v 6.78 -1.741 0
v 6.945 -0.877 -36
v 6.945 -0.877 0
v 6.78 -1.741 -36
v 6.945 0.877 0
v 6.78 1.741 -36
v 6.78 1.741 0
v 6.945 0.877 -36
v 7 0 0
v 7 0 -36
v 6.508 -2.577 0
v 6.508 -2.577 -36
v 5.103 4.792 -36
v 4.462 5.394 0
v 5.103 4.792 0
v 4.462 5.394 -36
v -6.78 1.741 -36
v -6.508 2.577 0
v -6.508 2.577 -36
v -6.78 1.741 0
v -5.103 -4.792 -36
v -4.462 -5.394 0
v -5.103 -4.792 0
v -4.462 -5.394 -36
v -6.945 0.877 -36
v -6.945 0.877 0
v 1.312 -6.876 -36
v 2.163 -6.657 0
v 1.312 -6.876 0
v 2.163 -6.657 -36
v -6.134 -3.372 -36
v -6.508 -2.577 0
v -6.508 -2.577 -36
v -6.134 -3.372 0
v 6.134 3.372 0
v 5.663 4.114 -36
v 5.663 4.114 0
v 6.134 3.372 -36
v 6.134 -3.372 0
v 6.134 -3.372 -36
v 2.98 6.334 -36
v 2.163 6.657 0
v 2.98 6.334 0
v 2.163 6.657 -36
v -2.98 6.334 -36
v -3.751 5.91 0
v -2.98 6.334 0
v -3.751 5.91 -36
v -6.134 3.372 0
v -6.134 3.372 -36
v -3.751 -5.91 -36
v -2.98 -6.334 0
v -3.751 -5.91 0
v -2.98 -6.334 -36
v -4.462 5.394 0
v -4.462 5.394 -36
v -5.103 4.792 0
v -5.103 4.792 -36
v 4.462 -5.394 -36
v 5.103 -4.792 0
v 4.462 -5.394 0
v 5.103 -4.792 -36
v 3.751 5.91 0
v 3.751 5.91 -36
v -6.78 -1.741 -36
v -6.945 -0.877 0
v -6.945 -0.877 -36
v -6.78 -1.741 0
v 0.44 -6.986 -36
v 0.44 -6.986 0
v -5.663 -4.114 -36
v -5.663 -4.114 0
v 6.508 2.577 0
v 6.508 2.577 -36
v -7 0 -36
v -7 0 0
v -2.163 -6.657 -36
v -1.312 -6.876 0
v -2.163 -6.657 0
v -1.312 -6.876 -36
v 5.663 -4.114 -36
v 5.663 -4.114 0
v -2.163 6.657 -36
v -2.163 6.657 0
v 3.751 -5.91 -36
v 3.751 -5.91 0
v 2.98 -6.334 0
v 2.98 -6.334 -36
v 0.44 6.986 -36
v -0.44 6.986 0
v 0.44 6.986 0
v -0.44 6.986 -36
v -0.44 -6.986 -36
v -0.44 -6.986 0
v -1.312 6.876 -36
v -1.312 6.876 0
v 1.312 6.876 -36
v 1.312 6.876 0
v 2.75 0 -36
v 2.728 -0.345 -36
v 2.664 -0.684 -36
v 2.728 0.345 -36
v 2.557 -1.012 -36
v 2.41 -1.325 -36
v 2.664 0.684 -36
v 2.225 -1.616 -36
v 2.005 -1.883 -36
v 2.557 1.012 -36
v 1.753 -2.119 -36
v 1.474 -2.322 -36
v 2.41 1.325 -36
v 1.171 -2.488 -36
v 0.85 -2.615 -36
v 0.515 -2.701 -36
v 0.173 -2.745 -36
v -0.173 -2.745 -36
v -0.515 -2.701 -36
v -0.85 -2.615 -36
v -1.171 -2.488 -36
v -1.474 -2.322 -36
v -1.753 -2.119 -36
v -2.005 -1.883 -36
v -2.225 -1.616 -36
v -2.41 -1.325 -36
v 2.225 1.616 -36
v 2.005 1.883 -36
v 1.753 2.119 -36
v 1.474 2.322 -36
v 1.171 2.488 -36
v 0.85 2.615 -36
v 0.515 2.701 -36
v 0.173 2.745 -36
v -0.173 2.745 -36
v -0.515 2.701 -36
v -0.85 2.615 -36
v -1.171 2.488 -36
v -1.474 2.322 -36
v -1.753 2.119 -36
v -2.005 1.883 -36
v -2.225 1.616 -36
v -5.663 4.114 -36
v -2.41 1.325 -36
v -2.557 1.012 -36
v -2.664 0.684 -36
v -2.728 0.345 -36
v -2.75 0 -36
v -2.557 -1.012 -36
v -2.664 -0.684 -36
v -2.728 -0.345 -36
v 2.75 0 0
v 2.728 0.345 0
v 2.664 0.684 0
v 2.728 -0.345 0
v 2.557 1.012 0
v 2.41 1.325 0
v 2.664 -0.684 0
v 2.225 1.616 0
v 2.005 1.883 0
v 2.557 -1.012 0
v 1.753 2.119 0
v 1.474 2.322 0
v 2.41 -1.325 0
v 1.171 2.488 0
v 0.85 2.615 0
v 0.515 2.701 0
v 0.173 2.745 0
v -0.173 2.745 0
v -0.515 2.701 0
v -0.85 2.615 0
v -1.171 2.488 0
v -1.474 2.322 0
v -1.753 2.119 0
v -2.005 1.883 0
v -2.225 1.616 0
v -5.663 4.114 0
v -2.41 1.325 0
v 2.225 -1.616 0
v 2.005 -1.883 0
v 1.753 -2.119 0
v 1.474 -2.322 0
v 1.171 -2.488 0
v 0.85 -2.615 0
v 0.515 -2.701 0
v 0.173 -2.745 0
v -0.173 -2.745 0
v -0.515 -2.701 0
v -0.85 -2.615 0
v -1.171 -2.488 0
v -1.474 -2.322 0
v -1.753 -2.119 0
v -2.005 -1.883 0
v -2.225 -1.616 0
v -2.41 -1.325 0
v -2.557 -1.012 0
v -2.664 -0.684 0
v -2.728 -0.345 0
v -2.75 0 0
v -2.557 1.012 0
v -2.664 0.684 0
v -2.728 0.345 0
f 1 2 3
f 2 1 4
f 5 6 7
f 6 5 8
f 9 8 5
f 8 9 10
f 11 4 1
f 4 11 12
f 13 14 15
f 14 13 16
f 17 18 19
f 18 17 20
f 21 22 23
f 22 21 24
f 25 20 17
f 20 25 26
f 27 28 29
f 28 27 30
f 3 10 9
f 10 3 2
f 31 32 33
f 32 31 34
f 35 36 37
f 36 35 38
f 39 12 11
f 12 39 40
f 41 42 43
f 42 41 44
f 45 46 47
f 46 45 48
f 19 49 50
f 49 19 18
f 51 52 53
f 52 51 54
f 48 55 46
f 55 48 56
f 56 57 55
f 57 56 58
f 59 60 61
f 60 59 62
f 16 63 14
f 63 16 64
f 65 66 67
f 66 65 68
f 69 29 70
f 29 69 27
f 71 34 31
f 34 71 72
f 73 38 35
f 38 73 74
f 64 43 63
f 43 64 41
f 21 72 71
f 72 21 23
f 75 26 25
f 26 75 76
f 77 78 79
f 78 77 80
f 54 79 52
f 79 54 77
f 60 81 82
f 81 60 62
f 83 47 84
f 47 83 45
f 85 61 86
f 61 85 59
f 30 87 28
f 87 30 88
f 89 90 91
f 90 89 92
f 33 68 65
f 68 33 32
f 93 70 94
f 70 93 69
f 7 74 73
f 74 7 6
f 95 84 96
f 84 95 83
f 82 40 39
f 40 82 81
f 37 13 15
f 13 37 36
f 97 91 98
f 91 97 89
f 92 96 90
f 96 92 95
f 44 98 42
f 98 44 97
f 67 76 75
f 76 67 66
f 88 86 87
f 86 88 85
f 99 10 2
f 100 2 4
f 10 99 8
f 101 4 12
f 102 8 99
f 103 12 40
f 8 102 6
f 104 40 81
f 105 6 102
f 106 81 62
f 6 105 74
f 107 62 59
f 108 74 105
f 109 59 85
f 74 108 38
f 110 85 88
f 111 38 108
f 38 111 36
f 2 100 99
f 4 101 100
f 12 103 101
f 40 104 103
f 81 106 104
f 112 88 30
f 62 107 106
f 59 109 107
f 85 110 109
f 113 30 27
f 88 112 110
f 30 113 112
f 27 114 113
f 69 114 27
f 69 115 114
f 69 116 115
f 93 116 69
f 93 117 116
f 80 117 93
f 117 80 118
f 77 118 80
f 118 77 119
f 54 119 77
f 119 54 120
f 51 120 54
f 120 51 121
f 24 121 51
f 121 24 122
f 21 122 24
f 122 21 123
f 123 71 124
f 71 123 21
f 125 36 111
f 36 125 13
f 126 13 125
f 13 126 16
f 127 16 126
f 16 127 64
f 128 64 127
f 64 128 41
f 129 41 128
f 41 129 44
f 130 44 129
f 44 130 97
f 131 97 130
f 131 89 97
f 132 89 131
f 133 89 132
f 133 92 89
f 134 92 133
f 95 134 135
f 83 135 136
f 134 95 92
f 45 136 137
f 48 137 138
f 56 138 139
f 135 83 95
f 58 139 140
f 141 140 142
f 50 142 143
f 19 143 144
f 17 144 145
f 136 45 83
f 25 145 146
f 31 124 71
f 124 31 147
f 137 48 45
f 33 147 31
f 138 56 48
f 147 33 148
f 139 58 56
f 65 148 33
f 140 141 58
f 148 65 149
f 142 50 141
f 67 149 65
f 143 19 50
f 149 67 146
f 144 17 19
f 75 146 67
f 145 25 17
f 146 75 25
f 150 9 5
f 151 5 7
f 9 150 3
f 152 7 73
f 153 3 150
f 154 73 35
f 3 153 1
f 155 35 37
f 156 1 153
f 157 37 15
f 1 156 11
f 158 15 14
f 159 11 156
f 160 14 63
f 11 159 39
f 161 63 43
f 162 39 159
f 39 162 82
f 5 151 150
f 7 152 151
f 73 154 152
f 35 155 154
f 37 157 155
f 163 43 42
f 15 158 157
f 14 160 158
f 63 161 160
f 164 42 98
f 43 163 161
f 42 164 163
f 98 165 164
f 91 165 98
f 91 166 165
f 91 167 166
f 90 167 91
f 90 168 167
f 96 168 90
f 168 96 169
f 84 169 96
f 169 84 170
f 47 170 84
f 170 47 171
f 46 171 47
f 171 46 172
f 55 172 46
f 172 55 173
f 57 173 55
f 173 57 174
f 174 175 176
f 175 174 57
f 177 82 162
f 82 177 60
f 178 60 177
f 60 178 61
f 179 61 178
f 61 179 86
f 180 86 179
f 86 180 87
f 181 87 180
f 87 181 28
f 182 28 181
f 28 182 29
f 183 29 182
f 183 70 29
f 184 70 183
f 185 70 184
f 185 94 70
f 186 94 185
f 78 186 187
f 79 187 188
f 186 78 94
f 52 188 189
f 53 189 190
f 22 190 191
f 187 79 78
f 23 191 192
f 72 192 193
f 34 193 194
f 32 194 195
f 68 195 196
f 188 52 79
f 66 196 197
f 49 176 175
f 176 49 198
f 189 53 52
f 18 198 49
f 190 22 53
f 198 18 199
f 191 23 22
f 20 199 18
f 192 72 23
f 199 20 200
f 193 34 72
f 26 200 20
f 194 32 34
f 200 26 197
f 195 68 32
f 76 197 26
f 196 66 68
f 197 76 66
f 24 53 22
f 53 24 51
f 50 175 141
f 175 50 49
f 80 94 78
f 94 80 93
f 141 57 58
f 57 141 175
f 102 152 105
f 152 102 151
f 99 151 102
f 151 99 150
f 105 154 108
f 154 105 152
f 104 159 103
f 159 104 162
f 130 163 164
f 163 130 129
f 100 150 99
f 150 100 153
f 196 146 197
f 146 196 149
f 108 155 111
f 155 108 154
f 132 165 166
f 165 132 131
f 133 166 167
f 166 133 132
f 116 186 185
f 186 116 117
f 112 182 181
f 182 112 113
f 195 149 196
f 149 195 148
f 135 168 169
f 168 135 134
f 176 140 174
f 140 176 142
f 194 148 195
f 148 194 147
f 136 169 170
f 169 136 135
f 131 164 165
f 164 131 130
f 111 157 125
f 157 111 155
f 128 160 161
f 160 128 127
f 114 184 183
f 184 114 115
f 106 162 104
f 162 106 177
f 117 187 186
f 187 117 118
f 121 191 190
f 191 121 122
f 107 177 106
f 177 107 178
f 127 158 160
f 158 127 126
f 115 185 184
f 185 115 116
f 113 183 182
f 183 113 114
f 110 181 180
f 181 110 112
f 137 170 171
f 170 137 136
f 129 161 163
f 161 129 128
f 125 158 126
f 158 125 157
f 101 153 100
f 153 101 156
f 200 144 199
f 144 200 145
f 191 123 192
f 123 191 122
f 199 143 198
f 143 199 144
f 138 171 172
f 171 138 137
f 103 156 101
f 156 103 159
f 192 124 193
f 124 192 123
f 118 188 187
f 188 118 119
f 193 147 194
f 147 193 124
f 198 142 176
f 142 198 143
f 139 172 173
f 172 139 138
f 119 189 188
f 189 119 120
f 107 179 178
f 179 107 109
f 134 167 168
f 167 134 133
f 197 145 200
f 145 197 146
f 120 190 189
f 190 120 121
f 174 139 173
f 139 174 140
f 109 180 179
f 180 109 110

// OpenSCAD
$fn = 50;


difference() {
	union() {
		translate(v = [0, 0, -36.0000000000]) {
			cylinder(h = 36, r = 7.0000000000);
		}
		cylinder(h = 0, r = 17.0000000000);
	}
	union() {
		#translate(v = [0, 0, -36]) {
			cylinder(h = 36, r = 2.7500000000);
		}
	}
}
